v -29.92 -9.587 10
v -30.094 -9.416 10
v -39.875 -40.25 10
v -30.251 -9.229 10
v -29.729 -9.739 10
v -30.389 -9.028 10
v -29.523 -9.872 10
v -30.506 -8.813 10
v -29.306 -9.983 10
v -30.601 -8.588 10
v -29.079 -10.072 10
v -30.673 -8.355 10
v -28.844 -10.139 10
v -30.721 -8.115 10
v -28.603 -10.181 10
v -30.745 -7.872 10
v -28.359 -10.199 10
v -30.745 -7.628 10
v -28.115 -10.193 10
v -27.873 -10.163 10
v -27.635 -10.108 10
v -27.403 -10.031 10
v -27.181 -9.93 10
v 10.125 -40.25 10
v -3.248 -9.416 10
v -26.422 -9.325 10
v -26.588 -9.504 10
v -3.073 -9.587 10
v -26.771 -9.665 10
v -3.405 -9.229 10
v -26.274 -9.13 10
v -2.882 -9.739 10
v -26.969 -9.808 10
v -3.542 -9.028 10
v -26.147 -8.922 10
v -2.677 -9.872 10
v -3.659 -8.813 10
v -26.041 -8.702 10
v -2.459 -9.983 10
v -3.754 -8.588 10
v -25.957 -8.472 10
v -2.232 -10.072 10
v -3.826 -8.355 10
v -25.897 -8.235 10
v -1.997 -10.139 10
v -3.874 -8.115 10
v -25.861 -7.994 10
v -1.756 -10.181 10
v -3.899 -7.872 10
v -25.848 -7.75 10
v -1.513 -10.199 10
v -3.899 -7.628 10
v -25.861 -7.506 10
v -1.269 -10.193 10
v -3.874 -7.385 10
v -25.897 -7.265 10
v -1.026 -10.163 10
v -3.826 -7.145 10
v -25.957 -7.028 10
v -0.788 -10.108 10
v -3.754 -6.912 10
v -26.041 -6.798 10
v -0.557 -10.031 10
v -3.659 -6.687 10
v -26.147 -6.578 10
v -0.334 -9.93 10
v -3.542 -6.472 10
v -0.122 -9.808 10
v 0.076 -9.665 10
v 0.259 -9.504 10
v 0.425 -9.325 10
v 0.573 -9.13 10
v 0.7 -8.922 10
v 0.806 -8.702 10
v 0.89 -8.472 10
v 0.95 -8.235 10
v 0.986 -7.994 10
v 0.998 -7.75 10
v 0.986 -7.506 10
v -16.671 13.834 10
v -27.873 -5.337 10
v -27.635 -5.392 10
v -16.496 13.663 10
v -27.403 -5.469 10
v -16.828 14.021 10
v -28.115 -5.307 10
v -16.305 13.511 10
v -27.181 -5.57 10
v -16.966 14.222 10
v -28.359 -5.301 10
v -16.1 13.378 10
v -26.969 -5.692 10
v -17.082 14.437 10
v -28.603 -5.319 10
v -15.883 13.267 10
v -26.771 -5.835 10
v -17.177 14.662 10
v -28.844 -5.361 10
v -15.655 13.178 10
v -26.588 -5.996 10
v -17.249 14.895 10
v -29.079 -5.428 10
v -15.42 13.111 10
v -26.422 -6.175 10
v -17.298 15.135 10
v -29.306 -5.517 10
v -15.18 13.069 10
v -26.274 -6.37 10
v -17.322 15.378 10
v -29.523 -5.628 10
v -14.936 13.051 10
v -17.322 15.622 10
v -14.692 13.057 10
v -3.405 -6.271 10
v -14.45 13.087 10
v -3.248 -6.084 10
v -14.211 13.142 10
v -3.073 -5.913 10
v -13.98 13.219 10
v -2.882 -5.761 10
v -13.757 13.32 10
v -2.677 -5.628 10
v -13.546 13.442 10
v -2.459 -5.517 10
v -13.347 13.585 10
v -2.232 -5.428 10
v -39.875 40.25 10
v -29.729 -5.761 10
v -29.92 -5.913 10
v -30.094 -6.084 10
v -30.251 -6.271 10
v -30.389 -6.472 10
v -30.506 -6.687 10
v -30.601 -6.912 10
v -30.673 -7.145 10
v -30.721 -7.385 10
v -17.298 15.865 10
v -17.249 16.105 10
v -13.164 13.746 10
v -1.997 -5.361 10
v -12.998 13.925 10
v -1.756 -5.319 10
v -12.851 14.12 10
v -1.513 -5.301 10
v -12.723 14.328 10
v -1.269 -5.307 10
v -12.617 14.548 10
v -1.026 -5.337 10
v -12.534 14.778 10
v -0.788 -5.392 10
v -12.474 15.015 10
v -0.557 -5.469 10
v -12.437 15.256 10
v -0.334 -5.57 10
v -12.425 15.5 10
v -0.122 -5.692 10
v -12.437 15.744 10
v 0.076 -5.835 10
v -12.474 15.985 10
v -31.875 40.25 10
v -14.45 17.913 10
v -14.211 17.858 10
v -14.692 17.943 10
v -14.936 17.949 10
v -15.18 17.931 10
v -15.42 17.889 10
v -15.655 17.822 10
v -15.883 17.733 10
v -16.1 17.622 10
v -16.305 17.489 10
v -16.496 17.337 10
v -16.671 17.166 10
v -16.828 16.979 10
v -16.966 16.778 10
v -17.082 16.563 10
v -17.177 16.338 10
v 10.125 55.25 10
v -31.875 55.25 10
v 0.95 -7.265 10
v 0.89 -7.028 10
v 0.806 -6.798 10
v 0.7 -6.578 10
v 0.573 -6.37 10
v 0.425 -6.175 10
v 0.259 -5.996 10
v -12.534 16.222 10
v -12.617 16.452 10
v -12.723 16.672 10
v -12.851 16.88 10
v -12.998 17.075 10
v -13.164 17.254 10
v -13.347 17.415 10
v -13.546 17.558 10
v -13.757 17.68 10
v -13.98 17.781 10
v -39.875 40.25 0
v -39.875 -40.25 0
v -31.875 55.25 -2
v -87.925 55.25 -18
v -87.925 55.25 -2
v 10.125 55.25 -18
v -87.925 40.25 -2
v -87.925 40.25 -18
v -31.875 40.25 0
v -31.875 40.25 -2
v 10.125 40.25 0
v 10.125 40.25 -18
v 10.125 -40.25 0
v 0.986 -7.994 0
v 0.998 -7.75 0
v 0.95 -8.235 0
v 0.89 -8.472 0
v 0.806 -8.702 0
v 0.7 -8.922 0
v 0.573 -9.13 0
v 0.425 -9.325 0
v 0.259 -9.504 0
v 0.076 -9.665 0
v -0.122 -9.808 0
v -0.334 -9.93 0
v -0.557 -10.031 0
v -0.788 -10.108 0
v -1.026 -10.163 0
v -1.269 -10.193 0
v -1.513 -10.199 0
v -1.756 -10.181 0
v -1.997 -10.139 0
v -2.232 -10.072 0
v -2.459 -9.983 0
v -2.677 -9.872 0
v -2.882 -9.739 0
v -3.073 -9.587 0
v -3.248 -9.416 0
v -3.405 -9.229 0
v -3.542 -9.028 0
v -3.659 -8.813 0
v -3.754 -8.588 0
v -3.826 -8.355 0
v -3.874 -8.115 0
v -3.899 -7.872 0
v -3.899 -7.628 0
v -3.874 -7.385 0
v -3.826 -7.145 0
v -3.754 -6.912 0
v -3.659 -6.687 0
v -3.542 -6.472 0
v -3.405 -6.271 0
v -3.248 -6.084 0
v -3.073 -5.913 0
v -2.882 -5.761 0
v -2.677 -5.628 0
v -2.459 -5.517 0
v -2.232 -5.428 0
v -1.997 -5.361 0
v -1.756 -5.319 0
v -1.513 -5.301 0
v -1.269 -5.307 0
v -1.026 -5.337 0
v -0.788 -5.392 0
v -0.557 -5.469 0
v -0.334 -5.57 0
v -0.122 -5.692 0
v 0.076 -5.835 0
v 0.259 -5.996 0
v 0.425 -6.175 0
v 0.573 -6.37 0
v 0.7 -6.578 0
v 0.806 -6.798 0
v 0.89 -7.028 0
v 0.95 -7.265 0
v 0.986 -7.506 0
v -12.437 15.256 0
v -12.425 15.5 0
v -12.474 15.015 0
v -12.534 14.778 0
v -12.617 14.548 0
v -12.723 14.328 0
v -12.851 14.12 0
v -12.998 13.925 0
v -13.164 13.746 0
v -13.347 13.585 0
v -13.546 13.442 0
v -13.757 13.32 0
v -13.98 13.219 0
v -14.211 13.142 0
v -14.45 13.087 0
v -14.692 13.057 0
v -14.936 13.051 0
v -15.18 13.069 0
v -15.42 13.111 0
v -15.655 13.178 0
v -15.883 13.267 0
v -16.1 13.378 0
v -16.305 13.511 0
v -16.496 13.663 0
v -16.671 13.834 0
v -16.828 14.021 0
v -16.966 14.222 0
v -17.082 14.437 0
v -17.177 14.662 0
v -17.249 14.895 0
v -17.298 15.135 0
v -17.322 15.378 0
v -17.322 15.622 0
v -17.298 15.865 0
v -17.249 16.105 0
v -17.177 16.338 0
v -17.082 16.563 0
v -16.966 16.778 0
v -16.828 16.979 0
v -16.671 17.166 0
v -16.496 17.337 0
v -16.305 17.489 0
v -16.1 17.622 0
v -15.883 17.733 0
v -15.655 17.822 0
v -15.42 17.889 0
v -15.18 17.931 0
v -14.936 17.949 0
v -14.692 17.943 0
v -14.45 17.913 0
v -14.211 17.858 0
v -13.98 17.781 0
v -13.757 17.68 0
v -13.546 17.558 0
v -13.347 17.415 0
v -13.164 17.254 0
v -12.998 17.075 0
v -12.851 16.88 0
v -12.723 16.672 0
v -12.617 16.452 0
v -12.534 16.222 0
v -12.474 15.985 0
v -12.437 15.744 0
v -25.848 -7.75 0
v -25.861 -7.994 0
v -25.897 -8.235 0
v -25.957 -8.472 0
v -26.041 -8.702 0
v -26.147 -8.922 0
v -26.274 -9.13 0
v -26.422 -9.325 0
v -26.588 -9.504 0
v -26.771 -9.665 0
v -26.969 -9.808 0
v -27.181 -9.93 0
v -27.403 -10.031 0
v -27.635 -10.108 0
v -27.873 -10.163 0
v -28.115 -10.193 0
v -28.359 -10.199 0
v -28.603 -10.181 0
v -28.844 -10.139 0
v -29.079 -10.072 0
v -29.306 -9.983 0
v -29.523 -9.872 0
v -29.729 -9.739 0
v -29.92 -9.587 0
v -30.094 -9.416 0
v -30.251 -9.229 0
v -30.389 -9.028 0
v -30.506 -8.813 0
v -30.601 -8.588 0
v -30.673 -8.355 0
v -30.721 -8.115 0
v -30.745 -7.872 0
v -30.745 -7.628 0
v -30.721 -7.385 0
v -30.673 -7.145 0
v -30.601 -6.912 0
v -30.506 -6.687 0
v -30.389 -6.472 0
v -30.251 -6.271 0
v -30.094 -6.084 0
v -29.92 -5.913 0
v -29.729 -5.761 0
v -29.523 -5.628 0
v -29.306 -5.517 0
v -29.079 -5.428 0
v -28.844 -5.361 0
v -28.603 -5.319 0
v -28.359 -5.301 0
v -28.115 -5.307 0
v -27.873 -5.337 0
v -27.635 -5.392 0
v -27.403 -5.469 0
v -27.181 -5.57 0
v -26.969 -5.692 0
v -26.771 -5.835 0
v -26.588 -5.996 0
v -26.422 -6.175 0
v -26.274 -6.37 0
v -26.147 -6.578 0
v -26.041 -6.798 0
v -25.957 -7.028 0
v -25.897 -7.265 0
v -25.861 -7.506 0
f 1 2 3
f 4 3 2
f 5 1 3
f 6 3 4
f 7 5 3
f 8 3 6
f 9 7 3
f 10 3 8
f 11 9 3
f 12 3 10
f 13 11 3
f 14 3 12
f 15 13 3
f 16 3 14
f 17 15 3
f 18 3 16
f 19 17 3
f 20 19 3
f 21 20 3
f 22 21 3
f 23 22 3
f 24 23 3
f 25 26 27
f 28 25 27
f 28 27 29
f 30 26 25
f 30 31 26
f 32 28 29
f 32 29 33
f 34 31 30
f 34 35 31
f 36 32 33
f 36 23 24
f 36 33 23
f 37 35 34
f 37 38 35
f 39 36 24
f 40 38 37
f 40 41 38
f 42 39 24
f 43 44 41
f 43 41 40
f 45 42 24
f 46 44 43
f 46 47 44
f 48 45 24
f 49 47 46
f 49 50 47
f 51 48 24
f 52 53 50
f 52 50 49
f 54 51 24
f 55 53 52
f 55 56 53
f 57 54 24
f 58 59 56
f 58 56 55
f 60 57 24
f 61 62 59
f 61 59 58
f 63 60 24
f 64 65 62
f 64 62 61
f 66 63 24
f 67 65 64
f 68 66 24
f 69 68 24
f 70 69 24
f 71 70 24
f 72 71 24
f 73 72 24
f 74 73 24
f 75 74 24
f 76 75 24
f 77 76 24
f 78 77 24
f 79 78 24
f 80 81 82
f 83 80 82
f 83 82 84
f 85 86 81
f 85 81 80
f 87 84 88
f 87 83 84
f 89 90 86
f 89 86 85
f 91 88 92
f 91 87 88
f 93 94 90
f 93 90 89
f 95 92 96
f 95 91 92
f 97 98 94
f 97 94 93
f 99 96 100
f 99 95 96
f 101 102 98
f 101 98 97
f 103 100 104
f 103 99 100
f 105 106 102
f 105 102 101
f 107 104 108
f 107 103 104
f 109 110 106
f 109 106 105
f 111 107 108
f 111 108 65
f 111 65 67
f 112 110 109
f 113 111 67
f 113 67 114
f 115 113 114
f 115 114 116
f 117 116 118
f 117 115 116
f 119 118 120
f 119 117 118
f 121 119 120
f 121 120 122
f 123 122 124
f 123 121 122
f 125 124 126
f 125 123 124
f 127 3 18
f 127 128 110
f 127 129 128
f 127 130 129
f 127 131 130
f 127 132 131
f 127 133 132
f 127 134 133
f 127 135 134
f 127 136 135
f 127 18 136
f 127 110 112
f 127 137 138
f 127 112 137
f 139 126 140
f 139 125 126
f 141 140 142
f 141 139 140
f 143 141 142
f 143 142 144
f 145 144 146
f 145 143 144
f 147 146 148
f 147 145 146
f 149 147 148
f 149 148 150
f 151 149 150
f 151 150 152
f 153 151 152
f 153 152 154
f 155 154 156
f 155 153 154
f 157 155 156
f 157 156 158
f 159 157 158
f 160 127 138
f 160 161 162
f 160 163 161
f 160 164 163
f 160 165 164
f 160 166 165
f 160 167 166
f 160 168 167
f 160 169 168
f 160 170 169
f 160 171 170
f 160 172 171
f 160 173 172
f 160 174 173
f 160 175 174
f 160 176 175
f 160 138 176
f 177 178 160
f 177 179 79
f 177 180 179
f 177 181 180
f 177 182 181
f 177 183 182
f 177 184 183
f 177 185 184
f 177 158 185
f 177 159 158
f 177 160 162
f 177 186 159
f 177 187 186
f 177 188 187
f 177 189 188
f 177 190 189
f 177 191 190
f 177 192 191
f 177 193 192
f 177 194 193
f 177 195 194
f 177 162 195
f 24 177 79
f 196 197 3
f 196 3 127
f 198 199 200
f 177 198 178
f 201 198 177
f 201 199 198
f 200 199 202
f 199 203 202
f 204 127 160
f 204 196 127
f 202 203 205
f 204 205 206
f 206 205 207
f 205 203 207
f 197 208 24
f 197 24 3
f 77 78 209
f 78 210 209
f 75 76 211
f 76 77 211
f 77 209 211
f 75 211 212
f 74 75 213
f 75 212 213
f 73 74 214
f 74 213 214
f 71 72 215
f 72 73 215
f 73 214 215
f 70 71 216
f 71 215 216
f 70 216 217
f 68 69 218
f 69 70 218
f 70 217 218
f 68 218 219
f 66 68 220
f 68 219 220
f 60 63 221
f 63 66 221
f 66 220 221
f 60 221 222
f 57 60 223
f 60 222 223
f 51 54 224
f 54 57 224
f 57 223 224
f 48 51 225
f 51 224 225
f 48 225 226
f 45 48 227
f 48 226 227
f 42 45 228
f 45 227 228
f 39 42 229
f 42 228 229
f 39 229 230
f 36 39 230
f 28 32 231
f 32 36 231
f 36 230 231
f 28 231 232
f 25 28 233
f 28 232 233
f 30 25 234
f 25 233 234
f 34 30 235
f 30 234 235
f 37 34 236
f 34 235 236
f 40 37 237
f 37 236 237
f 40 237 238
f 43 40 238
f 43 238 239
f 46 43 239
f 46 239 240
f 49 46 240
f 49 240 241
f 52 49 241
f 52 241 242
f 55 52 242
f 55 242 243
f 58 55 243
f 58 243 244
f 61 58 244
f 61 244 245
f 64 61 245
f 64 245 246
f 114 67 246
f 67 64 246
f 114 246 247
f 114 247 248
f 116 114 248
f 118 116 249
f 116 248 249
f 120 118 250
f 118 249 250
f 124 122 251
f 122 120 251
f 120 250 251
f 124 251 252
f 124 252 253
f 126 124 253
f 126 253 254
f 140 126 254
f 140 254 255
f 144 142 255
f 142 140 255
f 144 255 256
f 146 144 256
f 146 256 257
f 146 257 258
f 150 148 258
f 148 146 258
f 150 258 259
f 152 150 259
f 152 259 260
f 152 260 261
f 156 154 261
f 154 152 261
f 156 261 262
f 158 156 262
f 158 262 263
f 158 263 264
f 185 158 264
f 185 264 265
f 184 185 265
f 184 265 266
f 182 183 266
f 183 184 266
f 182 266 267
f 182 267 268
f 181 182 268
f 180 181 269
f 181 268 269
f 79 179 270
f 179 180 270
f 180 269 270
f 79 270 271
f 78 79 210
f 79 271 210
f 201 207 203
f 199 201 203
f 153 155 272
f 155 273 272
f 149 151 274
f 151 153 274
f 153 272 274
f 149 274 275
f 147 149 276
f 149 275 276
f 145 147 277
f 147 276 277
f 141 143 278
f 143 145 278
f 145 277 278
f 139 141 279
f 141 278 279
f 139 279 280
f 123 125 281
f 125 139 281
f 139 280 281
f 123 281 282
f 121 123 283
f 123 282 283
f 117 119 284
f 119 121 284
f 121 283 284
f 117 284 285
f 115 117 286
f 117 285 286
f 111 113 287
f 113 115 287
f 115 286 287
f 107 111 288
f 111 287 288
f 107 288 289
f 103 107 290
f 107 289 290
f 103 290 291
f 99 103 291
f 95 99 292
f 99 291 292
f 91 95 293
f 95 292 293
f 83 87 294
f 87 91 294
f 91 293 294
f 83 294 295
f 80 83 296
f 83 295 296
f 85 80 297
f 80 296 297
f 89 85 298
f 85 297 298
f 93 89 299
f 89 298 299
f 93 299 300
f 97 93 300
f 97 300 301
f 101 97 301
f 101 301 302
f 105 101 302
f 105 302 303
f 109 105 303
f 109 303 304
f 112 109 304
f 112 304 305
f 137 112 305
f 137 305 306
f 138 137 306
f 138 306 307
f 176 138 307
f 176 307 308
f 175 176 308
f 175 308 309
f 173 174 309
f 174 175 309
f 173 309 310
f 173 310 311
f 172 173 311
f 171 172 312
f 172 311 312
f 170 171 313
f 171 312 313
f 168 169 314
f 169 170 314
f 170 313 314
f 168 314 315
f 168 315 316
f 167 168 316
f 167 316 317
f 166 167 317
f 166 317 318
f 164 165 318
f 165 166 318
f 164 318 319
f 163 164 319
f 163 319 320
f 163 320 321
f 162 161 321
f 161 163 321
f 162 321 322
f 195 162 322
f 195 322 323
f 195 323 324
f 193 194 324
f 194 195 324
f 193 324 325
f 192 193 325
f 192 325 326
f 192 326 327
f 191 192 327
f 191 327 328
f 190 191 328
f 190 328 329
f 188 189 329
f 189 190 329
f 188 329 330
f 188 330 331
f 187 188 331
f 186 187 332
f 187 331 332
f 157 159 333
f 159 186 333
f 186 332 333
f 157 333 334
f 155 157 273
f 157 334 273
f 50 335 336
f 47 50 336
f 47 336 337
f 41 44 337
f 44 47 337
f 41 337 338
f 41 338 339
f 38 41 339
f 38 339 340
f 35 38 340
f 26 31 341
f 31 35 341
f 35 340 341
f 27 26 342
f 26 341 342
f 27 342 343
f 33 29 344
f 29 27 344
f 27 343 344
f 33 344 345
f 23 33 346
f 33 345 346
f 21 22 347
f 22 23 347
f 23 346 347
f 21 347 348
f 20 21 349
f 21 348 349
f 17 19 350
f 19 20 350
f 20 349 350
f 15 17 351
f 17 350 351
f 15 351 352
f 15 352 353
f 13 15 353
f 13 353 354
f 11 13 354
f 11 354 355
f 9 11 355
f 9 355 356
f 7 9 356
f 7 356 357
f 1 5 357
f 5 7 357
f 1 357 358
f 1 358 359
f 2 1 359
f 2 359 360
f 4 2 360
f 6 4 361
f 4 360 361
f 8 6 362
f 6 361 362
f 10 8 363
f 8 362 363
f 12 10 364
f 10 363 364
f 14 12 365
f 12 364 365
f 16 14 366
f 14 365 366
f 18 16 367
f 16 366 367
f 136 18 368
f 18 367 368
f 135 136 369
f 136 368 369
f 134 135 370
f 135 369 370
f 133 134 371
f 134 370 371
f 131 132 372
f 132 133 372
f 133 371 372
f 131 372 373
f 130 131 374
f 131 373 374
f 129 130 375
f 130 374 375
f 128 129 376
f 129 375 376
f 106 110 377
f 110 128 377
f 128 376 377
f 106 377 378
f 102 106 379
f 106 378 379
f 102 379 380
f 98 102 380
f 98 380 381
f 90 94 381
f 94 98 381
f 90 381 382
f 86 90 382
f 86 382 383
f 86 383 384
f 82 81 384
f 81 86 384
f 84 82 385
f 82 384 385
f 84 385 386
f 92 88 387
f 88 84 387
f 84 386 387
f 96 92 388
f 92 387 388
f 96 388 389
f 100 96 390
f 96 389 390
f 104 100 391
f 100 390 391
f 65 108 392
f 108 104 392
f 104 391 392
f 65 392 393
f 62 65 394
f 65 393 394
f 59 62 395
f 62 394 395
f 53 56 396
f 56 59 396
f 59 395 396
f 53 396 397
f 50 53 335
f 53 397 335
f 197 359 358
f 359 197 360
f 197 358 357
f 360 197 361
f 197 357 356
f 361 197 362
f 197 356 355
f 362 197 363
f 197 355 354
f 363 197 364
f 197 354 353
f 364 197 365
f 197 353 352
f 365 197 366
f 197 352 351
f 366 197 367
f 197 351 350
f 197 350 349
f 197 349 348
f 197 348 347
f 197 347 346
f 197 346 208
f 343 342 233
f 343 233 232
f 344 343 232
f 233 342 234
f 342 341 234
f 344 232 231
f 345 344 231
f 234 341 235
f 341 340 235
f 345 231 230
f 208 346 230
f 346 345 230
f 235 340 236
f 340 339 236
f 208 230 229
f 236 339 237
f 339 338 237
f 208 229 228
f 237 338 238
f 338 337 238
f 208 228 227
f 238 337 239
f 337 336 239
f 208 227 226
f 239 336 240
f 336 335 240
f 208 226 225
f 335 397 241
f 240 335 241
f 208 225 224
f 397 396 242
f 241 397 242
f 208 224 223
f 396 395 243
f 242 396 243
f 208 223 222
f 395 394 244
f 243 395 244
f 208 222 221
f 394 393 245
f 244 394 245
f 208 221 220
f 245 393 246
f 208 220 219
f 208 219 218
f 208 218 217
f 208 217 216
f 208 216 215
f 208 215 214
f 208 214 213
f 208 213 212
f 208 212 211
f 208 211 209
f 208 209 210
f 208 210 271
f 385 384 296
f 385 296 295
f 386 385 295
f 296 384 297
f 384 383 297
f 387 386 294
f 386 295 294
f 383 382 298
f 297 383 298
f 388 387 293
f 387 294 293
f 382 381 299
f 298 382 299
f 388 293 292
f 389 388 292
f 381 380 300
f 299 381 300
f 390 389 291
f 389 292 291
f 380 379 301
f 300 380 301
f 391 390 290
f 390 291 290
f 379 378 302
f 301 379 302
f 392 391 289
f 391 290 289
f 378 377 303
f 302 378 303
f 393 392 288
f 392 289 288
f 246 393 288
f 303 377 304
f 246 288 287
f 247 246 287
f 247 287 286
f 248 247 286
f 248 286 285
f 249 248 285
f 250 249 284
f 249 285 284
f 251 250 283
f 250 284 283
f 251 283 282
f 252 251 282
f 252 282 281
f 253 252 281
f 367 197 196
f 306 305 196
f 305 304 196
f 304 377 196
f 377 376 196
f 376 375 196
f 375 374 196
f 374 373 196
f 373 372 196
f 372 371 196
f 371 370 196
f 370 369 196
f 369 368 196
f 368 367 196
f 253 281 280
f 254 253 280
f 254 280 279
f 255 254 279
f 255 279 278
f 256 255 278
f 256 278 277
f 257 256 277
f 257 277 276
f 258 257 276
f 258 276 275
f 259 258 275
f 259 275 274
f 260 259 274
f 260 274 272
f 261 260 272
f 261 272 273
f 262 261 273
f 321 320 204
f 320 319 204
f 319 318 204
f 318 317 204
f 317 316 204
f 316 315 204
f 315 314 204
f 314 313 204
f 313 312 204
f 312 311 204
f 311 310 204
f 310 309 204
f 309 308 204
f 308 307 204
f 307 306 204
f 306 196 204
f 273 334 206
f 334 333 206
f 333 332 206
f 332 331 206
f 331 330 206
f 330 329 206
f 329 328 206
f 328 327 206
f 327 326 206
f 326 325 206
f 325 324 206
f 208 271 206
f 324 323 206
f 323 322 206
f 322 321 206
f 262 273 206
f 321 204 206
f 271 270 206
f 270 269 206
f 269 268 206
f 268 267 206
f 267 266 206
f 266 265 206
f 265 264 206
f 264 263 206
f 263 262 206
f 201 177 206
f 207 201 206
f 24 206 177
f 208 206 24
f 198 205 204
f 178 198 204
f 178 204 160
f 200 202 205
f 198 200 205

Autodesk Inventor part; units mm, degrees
ref_plane "YZ Plane" through (0, 0, 0) normal (1, 0, 0) x (0, 1, 0)
ref_plane "XZ Plane" through (0, 0, 0) normal (0, 1, 0) x (-1, 0, 0)
ref_plane "XY Plane" through (0, 0, 0) normal (0, 0, 1) x (1, 0, 0)
ref_plane "Arbeitsebene1" through (0, 0, 0) normal (0, 0, 1) x (1, 0, 0)
sketch "Skizze1" plane through (0, 0, 0) normal (0, 0, 1) x (1, 0, 0)
  circle A0 centre (-14.875, 15.5) radius 2.45 projected
  circle A1 centre (-28.2984, -7.75) radius 2.45 projected
  circle A2 centre (-1.4516, -7.75) radius 2.45 projected
  line L0 (-72.925, 40.25) -> (85.125, 40.25) projected
  line L1 (85.125, -40.25) -> (-72.925, -40.25) projected
  line L2 (10.125, -40.25) -> (-39.875, -40.25)
  line L3 (-39.875, -40.25) -> (-39.875, 40.25)
  line L4 (-39.875, 40.25) -> (10.125, 40.25)
  line L5 (10.125, 40.25) -> (10.125, -40.25)
  circle A3 centre (-28.2984, -7.75) radius 2.45
  circle A4 centre (-1.4516, -7.75) radius 2.45
  circle A5 centre (-14.875, 15.5) radius 2.45
  point P0 (0, 0)
  dimension "d4" = 25
  dimension "d5" = 50
extrude "Extrusion1" add sketch "Skizze1" along normal blind 10
ref_plane "Arbeitsebene2" through (-39.875, 40.25, 0) normal (0, 1, 0) x (1, 0, 0)
sketch "Skizze4" plane through (-39.875, 40.25, 0) normal (0, 1, 0) x (1, 0, 0)
  line L0 (50, 0) -> (50, -10) projected
  line L1 (50, -10) -> (50, 18)
  line L2 (50, 18) -> (-48.05, 18)
  line L3 (-48.05, 18) -> (-48.05, 2)
  line L4 (-48.05, 2) -> (8, 2)
  line L5 (8, 2) -> (8, -10)
  line L6 (50, -10) -> (0, -10) projected
  line L7 (50, -10) -> (8, -10)
  line L8 (-48.05, -54) -> (-48.05, 13) projected
  point P0 (39.875, 0)
  dimension "d15" = 28
  dimension "d17" = 90
  dimension "d22" = 0
  dimension "d23" = 98.05
extrude "Extrusion3" add sketch "Skizze4" along normal blind 15
properties part number "Querplattenaufsatz"
